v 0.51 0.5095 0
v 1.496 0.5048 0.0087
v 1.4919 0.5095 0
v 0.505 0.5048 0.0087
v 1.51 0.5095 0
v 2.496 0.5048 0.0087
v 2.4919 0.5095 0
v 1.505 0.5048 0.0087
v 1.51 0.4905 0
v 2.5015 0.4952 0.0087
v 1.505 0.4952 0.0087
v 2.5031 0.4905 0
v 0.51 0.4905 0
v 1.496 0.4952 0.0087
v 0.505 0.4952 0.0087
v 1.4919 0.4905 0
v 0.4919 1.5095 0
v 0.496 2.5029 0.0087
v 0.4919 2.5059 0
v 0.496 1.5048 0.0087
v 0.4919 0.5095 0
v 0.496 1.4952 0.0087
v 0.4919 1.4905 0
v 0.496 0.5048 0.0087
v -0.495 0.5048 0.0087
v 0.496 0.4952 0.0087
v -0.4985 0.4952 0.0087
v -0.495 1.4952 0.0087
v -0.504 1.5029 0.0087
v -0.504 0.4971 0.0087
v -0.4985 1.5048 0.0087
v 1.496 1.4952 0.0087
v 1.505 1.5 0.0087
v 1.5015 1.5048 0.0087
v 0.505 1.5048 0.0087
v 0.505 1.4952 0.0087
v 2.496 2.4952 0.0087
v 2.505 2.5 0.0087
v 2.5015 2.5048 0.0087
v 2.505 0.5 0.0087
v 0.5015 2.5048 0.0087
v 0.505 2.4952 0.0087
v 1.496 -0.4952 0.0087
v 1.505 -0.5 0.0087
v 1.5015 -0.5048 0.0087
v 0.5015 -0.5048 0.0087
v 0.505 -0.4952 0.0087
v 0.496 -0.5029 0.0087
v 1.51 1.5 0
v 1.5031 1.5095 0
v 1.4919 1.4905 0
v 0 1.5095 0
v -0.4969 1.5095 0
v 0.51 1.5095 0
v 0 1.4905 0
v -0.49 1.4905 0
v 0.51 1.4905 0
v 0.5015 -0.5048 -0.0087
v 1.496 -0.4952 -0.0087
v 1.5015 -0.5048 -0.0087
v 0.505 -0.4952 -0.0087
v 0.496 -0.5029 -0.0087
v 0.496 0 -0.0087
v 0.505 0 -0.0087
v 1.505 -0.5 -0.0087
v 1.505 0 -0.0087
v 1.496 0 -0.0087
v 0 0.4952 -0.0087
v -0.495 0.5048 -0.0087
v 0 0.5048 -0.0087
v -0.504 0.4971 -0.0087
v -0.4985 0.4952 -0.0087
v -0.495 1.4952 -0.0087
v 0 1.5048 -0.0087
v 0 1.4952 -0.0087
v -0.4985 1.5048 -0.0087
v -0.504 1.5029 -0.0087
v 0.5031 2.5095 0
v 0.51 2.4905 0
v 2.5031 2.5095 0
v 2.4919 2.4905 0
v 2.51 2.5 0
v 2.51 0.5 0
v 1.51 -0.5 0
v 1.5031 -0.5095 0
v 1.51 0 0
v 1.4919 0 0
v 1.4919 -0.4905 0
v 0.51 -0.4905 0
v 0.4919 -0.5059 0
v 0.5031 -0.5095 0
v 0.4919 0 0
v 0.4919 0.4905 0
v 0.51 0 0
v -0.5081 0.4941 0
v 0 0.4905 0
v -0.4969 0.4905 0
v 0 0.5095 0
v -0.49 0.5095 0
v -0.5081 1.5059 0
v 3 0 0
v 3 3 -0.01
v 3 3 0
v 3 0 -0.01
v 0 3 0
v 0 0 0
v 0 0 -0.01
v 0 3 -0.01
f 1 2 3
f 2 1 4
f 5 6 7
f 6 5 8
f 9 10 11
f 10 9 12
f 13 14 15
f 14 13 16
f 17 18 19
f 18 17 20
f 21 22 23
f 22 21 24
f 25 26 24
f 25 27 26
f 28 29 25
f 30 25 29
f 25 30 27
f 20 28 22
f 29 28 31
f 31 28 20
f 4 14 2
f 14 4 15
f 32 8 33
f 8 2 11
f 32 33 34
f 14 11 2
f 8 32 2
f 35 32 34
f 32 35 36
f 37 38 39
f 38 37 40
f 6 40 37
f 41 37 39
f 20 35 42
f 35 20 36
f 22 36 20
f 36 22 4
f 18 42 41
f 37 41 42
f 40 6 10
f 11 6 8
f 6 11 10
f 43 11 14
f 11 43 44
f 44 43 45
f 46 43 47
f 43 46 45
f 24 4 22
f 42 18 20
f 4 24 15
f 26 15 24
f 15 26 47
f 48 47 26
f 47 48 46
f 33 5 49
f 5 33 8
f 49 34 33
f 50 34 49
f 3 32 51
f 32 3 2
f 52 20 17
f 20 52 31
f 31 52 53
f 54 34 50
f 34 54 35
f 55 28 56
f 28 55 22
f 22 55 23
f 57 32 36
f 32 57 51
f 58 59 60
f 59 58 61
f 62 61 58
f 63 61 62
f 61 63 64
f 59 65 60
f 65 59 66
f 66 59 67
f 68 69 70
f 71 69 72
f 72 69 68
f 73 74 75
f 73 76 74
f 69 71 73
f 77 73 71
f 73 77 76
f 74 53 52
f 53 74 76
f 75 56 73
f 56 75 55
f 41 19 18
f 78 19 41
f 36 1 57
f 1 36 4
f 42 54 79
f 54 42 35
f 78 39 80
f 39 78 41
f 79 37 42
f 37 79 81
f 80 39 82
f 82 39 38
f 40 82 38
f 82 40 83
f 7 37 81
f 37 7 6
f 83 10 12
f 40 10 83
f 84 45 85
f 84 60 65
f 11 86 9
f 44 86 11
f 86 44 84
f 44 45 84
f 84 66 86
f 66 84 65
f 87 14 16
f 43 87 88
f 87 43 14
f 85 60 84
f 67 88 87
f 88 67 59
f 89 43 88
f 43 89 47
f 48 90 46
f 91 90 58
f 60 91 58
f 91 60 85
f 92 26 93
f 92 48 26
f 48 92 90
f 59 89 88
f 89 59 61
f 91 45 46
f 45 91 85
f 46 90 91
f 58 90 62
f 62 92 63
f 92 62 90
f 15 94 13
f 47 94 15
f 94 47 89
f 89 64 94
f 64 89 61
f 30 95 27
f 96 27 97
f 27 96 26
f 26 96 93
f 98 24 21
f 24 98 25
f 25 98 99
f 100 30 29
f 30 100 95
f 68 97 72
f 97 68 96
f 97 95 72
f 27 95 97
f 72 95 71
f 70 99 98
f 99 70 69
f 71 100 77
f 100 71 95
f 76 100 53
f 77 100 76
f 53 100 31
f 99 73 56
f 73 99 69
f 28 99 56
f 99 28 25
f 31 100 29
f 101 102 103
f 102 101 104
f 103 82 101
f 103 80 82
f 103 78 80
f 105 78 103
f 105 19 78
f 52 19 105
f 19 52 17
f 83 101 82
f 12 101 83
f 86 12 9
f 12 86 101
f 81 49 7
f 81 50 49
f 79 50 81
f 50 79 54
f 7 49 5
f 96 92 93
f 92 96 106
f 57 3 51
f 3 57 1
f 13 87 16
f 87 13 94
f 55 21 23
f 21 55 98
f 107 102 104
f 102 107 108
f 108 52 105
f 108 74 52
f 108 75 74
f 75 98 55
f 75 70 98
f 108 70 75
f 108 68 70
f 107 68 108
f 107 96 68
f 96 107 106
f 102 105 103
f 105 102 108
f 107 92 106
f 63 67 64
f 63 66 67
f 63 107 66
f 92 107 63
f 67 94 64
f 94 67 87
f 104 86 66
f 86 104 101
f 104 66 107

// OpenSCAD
hull(){
    translate([0.5, 0.5]) sphere(0.01);
    translate([1.5, 0.5]) sphere(0.01);
}
hull(){
    translate([1.5, 0.5]) sphere(0.01);
    translate([1.5, 1.5]) sphere(0.01);
}
hull(){
    translate([1.5, 1.5]) sphere(0.01);
    translate([0.5, 1.5]) sphere(0.01);
}
hull(){
    translate([0.5, 1.5]) sphere(0.01);
    translate([0.5, 2.5]) sphere(0.01);
}
hull(){
    translate([0.5, 2.5]) sphere(0.01);
    translate([1.5, 2.5]) sphere(0.01);
}
hull(){
    translate([1.5, 2.5]) sphere(0.01);
    translate([2.5, 2.5]) sphere(0.01);
}
hull(){
    translate([2.5, 2.5]) sphere(0.01);
    translate([2.5, 1.5]) sphere(0.01);
}
hull(){
    translate([2.5, 1.5]) sphere(0.01);
    translate([2.5, 0.5]) sphere(0.01);
}
hull(){
    translate([2.5, 0.5]) sphere(0.01);
    translate([1.5, 0.5]) sphere(0.01);
}
hull(){
    translate([1.5, 0.5]) sphere(0.01);
    translate([1.5, -0.5]) sphere(0.01);
}
hull(){
    translate([1.5, -0.5]) sphere(0.01);
    translate([0.5, -0.5]) sphere(0.01);
}
hull(){
    translate([0.5, -0.5]) sphere(0.01);
    translate([0.5, 0.5]) sphere(0.01);
}
hull(){
    translate([0.5, 0.5]) sphere(0.01);
    translate([-0.5, 0.5]) sphere(0.01);
}
hull(){
    translate([-0.5, 0.5]) sphere(0.01);
    translate([-0.5, 1.5]) sphere(0.01);
}
hull(){
    translate([-0.5, 1.5]) sphere(0.01);
    translate([0.5, 1.5]) sphere(0.01);
}
hull(){
    translate([0.5, 1.5]) sphere(0.01);
    translate([0.5, 0.5]) sphere(0.01);
}
translate([0,0,-0.01]) color([0.1,0.1,0.1]) cube([3,3,0.01]);
